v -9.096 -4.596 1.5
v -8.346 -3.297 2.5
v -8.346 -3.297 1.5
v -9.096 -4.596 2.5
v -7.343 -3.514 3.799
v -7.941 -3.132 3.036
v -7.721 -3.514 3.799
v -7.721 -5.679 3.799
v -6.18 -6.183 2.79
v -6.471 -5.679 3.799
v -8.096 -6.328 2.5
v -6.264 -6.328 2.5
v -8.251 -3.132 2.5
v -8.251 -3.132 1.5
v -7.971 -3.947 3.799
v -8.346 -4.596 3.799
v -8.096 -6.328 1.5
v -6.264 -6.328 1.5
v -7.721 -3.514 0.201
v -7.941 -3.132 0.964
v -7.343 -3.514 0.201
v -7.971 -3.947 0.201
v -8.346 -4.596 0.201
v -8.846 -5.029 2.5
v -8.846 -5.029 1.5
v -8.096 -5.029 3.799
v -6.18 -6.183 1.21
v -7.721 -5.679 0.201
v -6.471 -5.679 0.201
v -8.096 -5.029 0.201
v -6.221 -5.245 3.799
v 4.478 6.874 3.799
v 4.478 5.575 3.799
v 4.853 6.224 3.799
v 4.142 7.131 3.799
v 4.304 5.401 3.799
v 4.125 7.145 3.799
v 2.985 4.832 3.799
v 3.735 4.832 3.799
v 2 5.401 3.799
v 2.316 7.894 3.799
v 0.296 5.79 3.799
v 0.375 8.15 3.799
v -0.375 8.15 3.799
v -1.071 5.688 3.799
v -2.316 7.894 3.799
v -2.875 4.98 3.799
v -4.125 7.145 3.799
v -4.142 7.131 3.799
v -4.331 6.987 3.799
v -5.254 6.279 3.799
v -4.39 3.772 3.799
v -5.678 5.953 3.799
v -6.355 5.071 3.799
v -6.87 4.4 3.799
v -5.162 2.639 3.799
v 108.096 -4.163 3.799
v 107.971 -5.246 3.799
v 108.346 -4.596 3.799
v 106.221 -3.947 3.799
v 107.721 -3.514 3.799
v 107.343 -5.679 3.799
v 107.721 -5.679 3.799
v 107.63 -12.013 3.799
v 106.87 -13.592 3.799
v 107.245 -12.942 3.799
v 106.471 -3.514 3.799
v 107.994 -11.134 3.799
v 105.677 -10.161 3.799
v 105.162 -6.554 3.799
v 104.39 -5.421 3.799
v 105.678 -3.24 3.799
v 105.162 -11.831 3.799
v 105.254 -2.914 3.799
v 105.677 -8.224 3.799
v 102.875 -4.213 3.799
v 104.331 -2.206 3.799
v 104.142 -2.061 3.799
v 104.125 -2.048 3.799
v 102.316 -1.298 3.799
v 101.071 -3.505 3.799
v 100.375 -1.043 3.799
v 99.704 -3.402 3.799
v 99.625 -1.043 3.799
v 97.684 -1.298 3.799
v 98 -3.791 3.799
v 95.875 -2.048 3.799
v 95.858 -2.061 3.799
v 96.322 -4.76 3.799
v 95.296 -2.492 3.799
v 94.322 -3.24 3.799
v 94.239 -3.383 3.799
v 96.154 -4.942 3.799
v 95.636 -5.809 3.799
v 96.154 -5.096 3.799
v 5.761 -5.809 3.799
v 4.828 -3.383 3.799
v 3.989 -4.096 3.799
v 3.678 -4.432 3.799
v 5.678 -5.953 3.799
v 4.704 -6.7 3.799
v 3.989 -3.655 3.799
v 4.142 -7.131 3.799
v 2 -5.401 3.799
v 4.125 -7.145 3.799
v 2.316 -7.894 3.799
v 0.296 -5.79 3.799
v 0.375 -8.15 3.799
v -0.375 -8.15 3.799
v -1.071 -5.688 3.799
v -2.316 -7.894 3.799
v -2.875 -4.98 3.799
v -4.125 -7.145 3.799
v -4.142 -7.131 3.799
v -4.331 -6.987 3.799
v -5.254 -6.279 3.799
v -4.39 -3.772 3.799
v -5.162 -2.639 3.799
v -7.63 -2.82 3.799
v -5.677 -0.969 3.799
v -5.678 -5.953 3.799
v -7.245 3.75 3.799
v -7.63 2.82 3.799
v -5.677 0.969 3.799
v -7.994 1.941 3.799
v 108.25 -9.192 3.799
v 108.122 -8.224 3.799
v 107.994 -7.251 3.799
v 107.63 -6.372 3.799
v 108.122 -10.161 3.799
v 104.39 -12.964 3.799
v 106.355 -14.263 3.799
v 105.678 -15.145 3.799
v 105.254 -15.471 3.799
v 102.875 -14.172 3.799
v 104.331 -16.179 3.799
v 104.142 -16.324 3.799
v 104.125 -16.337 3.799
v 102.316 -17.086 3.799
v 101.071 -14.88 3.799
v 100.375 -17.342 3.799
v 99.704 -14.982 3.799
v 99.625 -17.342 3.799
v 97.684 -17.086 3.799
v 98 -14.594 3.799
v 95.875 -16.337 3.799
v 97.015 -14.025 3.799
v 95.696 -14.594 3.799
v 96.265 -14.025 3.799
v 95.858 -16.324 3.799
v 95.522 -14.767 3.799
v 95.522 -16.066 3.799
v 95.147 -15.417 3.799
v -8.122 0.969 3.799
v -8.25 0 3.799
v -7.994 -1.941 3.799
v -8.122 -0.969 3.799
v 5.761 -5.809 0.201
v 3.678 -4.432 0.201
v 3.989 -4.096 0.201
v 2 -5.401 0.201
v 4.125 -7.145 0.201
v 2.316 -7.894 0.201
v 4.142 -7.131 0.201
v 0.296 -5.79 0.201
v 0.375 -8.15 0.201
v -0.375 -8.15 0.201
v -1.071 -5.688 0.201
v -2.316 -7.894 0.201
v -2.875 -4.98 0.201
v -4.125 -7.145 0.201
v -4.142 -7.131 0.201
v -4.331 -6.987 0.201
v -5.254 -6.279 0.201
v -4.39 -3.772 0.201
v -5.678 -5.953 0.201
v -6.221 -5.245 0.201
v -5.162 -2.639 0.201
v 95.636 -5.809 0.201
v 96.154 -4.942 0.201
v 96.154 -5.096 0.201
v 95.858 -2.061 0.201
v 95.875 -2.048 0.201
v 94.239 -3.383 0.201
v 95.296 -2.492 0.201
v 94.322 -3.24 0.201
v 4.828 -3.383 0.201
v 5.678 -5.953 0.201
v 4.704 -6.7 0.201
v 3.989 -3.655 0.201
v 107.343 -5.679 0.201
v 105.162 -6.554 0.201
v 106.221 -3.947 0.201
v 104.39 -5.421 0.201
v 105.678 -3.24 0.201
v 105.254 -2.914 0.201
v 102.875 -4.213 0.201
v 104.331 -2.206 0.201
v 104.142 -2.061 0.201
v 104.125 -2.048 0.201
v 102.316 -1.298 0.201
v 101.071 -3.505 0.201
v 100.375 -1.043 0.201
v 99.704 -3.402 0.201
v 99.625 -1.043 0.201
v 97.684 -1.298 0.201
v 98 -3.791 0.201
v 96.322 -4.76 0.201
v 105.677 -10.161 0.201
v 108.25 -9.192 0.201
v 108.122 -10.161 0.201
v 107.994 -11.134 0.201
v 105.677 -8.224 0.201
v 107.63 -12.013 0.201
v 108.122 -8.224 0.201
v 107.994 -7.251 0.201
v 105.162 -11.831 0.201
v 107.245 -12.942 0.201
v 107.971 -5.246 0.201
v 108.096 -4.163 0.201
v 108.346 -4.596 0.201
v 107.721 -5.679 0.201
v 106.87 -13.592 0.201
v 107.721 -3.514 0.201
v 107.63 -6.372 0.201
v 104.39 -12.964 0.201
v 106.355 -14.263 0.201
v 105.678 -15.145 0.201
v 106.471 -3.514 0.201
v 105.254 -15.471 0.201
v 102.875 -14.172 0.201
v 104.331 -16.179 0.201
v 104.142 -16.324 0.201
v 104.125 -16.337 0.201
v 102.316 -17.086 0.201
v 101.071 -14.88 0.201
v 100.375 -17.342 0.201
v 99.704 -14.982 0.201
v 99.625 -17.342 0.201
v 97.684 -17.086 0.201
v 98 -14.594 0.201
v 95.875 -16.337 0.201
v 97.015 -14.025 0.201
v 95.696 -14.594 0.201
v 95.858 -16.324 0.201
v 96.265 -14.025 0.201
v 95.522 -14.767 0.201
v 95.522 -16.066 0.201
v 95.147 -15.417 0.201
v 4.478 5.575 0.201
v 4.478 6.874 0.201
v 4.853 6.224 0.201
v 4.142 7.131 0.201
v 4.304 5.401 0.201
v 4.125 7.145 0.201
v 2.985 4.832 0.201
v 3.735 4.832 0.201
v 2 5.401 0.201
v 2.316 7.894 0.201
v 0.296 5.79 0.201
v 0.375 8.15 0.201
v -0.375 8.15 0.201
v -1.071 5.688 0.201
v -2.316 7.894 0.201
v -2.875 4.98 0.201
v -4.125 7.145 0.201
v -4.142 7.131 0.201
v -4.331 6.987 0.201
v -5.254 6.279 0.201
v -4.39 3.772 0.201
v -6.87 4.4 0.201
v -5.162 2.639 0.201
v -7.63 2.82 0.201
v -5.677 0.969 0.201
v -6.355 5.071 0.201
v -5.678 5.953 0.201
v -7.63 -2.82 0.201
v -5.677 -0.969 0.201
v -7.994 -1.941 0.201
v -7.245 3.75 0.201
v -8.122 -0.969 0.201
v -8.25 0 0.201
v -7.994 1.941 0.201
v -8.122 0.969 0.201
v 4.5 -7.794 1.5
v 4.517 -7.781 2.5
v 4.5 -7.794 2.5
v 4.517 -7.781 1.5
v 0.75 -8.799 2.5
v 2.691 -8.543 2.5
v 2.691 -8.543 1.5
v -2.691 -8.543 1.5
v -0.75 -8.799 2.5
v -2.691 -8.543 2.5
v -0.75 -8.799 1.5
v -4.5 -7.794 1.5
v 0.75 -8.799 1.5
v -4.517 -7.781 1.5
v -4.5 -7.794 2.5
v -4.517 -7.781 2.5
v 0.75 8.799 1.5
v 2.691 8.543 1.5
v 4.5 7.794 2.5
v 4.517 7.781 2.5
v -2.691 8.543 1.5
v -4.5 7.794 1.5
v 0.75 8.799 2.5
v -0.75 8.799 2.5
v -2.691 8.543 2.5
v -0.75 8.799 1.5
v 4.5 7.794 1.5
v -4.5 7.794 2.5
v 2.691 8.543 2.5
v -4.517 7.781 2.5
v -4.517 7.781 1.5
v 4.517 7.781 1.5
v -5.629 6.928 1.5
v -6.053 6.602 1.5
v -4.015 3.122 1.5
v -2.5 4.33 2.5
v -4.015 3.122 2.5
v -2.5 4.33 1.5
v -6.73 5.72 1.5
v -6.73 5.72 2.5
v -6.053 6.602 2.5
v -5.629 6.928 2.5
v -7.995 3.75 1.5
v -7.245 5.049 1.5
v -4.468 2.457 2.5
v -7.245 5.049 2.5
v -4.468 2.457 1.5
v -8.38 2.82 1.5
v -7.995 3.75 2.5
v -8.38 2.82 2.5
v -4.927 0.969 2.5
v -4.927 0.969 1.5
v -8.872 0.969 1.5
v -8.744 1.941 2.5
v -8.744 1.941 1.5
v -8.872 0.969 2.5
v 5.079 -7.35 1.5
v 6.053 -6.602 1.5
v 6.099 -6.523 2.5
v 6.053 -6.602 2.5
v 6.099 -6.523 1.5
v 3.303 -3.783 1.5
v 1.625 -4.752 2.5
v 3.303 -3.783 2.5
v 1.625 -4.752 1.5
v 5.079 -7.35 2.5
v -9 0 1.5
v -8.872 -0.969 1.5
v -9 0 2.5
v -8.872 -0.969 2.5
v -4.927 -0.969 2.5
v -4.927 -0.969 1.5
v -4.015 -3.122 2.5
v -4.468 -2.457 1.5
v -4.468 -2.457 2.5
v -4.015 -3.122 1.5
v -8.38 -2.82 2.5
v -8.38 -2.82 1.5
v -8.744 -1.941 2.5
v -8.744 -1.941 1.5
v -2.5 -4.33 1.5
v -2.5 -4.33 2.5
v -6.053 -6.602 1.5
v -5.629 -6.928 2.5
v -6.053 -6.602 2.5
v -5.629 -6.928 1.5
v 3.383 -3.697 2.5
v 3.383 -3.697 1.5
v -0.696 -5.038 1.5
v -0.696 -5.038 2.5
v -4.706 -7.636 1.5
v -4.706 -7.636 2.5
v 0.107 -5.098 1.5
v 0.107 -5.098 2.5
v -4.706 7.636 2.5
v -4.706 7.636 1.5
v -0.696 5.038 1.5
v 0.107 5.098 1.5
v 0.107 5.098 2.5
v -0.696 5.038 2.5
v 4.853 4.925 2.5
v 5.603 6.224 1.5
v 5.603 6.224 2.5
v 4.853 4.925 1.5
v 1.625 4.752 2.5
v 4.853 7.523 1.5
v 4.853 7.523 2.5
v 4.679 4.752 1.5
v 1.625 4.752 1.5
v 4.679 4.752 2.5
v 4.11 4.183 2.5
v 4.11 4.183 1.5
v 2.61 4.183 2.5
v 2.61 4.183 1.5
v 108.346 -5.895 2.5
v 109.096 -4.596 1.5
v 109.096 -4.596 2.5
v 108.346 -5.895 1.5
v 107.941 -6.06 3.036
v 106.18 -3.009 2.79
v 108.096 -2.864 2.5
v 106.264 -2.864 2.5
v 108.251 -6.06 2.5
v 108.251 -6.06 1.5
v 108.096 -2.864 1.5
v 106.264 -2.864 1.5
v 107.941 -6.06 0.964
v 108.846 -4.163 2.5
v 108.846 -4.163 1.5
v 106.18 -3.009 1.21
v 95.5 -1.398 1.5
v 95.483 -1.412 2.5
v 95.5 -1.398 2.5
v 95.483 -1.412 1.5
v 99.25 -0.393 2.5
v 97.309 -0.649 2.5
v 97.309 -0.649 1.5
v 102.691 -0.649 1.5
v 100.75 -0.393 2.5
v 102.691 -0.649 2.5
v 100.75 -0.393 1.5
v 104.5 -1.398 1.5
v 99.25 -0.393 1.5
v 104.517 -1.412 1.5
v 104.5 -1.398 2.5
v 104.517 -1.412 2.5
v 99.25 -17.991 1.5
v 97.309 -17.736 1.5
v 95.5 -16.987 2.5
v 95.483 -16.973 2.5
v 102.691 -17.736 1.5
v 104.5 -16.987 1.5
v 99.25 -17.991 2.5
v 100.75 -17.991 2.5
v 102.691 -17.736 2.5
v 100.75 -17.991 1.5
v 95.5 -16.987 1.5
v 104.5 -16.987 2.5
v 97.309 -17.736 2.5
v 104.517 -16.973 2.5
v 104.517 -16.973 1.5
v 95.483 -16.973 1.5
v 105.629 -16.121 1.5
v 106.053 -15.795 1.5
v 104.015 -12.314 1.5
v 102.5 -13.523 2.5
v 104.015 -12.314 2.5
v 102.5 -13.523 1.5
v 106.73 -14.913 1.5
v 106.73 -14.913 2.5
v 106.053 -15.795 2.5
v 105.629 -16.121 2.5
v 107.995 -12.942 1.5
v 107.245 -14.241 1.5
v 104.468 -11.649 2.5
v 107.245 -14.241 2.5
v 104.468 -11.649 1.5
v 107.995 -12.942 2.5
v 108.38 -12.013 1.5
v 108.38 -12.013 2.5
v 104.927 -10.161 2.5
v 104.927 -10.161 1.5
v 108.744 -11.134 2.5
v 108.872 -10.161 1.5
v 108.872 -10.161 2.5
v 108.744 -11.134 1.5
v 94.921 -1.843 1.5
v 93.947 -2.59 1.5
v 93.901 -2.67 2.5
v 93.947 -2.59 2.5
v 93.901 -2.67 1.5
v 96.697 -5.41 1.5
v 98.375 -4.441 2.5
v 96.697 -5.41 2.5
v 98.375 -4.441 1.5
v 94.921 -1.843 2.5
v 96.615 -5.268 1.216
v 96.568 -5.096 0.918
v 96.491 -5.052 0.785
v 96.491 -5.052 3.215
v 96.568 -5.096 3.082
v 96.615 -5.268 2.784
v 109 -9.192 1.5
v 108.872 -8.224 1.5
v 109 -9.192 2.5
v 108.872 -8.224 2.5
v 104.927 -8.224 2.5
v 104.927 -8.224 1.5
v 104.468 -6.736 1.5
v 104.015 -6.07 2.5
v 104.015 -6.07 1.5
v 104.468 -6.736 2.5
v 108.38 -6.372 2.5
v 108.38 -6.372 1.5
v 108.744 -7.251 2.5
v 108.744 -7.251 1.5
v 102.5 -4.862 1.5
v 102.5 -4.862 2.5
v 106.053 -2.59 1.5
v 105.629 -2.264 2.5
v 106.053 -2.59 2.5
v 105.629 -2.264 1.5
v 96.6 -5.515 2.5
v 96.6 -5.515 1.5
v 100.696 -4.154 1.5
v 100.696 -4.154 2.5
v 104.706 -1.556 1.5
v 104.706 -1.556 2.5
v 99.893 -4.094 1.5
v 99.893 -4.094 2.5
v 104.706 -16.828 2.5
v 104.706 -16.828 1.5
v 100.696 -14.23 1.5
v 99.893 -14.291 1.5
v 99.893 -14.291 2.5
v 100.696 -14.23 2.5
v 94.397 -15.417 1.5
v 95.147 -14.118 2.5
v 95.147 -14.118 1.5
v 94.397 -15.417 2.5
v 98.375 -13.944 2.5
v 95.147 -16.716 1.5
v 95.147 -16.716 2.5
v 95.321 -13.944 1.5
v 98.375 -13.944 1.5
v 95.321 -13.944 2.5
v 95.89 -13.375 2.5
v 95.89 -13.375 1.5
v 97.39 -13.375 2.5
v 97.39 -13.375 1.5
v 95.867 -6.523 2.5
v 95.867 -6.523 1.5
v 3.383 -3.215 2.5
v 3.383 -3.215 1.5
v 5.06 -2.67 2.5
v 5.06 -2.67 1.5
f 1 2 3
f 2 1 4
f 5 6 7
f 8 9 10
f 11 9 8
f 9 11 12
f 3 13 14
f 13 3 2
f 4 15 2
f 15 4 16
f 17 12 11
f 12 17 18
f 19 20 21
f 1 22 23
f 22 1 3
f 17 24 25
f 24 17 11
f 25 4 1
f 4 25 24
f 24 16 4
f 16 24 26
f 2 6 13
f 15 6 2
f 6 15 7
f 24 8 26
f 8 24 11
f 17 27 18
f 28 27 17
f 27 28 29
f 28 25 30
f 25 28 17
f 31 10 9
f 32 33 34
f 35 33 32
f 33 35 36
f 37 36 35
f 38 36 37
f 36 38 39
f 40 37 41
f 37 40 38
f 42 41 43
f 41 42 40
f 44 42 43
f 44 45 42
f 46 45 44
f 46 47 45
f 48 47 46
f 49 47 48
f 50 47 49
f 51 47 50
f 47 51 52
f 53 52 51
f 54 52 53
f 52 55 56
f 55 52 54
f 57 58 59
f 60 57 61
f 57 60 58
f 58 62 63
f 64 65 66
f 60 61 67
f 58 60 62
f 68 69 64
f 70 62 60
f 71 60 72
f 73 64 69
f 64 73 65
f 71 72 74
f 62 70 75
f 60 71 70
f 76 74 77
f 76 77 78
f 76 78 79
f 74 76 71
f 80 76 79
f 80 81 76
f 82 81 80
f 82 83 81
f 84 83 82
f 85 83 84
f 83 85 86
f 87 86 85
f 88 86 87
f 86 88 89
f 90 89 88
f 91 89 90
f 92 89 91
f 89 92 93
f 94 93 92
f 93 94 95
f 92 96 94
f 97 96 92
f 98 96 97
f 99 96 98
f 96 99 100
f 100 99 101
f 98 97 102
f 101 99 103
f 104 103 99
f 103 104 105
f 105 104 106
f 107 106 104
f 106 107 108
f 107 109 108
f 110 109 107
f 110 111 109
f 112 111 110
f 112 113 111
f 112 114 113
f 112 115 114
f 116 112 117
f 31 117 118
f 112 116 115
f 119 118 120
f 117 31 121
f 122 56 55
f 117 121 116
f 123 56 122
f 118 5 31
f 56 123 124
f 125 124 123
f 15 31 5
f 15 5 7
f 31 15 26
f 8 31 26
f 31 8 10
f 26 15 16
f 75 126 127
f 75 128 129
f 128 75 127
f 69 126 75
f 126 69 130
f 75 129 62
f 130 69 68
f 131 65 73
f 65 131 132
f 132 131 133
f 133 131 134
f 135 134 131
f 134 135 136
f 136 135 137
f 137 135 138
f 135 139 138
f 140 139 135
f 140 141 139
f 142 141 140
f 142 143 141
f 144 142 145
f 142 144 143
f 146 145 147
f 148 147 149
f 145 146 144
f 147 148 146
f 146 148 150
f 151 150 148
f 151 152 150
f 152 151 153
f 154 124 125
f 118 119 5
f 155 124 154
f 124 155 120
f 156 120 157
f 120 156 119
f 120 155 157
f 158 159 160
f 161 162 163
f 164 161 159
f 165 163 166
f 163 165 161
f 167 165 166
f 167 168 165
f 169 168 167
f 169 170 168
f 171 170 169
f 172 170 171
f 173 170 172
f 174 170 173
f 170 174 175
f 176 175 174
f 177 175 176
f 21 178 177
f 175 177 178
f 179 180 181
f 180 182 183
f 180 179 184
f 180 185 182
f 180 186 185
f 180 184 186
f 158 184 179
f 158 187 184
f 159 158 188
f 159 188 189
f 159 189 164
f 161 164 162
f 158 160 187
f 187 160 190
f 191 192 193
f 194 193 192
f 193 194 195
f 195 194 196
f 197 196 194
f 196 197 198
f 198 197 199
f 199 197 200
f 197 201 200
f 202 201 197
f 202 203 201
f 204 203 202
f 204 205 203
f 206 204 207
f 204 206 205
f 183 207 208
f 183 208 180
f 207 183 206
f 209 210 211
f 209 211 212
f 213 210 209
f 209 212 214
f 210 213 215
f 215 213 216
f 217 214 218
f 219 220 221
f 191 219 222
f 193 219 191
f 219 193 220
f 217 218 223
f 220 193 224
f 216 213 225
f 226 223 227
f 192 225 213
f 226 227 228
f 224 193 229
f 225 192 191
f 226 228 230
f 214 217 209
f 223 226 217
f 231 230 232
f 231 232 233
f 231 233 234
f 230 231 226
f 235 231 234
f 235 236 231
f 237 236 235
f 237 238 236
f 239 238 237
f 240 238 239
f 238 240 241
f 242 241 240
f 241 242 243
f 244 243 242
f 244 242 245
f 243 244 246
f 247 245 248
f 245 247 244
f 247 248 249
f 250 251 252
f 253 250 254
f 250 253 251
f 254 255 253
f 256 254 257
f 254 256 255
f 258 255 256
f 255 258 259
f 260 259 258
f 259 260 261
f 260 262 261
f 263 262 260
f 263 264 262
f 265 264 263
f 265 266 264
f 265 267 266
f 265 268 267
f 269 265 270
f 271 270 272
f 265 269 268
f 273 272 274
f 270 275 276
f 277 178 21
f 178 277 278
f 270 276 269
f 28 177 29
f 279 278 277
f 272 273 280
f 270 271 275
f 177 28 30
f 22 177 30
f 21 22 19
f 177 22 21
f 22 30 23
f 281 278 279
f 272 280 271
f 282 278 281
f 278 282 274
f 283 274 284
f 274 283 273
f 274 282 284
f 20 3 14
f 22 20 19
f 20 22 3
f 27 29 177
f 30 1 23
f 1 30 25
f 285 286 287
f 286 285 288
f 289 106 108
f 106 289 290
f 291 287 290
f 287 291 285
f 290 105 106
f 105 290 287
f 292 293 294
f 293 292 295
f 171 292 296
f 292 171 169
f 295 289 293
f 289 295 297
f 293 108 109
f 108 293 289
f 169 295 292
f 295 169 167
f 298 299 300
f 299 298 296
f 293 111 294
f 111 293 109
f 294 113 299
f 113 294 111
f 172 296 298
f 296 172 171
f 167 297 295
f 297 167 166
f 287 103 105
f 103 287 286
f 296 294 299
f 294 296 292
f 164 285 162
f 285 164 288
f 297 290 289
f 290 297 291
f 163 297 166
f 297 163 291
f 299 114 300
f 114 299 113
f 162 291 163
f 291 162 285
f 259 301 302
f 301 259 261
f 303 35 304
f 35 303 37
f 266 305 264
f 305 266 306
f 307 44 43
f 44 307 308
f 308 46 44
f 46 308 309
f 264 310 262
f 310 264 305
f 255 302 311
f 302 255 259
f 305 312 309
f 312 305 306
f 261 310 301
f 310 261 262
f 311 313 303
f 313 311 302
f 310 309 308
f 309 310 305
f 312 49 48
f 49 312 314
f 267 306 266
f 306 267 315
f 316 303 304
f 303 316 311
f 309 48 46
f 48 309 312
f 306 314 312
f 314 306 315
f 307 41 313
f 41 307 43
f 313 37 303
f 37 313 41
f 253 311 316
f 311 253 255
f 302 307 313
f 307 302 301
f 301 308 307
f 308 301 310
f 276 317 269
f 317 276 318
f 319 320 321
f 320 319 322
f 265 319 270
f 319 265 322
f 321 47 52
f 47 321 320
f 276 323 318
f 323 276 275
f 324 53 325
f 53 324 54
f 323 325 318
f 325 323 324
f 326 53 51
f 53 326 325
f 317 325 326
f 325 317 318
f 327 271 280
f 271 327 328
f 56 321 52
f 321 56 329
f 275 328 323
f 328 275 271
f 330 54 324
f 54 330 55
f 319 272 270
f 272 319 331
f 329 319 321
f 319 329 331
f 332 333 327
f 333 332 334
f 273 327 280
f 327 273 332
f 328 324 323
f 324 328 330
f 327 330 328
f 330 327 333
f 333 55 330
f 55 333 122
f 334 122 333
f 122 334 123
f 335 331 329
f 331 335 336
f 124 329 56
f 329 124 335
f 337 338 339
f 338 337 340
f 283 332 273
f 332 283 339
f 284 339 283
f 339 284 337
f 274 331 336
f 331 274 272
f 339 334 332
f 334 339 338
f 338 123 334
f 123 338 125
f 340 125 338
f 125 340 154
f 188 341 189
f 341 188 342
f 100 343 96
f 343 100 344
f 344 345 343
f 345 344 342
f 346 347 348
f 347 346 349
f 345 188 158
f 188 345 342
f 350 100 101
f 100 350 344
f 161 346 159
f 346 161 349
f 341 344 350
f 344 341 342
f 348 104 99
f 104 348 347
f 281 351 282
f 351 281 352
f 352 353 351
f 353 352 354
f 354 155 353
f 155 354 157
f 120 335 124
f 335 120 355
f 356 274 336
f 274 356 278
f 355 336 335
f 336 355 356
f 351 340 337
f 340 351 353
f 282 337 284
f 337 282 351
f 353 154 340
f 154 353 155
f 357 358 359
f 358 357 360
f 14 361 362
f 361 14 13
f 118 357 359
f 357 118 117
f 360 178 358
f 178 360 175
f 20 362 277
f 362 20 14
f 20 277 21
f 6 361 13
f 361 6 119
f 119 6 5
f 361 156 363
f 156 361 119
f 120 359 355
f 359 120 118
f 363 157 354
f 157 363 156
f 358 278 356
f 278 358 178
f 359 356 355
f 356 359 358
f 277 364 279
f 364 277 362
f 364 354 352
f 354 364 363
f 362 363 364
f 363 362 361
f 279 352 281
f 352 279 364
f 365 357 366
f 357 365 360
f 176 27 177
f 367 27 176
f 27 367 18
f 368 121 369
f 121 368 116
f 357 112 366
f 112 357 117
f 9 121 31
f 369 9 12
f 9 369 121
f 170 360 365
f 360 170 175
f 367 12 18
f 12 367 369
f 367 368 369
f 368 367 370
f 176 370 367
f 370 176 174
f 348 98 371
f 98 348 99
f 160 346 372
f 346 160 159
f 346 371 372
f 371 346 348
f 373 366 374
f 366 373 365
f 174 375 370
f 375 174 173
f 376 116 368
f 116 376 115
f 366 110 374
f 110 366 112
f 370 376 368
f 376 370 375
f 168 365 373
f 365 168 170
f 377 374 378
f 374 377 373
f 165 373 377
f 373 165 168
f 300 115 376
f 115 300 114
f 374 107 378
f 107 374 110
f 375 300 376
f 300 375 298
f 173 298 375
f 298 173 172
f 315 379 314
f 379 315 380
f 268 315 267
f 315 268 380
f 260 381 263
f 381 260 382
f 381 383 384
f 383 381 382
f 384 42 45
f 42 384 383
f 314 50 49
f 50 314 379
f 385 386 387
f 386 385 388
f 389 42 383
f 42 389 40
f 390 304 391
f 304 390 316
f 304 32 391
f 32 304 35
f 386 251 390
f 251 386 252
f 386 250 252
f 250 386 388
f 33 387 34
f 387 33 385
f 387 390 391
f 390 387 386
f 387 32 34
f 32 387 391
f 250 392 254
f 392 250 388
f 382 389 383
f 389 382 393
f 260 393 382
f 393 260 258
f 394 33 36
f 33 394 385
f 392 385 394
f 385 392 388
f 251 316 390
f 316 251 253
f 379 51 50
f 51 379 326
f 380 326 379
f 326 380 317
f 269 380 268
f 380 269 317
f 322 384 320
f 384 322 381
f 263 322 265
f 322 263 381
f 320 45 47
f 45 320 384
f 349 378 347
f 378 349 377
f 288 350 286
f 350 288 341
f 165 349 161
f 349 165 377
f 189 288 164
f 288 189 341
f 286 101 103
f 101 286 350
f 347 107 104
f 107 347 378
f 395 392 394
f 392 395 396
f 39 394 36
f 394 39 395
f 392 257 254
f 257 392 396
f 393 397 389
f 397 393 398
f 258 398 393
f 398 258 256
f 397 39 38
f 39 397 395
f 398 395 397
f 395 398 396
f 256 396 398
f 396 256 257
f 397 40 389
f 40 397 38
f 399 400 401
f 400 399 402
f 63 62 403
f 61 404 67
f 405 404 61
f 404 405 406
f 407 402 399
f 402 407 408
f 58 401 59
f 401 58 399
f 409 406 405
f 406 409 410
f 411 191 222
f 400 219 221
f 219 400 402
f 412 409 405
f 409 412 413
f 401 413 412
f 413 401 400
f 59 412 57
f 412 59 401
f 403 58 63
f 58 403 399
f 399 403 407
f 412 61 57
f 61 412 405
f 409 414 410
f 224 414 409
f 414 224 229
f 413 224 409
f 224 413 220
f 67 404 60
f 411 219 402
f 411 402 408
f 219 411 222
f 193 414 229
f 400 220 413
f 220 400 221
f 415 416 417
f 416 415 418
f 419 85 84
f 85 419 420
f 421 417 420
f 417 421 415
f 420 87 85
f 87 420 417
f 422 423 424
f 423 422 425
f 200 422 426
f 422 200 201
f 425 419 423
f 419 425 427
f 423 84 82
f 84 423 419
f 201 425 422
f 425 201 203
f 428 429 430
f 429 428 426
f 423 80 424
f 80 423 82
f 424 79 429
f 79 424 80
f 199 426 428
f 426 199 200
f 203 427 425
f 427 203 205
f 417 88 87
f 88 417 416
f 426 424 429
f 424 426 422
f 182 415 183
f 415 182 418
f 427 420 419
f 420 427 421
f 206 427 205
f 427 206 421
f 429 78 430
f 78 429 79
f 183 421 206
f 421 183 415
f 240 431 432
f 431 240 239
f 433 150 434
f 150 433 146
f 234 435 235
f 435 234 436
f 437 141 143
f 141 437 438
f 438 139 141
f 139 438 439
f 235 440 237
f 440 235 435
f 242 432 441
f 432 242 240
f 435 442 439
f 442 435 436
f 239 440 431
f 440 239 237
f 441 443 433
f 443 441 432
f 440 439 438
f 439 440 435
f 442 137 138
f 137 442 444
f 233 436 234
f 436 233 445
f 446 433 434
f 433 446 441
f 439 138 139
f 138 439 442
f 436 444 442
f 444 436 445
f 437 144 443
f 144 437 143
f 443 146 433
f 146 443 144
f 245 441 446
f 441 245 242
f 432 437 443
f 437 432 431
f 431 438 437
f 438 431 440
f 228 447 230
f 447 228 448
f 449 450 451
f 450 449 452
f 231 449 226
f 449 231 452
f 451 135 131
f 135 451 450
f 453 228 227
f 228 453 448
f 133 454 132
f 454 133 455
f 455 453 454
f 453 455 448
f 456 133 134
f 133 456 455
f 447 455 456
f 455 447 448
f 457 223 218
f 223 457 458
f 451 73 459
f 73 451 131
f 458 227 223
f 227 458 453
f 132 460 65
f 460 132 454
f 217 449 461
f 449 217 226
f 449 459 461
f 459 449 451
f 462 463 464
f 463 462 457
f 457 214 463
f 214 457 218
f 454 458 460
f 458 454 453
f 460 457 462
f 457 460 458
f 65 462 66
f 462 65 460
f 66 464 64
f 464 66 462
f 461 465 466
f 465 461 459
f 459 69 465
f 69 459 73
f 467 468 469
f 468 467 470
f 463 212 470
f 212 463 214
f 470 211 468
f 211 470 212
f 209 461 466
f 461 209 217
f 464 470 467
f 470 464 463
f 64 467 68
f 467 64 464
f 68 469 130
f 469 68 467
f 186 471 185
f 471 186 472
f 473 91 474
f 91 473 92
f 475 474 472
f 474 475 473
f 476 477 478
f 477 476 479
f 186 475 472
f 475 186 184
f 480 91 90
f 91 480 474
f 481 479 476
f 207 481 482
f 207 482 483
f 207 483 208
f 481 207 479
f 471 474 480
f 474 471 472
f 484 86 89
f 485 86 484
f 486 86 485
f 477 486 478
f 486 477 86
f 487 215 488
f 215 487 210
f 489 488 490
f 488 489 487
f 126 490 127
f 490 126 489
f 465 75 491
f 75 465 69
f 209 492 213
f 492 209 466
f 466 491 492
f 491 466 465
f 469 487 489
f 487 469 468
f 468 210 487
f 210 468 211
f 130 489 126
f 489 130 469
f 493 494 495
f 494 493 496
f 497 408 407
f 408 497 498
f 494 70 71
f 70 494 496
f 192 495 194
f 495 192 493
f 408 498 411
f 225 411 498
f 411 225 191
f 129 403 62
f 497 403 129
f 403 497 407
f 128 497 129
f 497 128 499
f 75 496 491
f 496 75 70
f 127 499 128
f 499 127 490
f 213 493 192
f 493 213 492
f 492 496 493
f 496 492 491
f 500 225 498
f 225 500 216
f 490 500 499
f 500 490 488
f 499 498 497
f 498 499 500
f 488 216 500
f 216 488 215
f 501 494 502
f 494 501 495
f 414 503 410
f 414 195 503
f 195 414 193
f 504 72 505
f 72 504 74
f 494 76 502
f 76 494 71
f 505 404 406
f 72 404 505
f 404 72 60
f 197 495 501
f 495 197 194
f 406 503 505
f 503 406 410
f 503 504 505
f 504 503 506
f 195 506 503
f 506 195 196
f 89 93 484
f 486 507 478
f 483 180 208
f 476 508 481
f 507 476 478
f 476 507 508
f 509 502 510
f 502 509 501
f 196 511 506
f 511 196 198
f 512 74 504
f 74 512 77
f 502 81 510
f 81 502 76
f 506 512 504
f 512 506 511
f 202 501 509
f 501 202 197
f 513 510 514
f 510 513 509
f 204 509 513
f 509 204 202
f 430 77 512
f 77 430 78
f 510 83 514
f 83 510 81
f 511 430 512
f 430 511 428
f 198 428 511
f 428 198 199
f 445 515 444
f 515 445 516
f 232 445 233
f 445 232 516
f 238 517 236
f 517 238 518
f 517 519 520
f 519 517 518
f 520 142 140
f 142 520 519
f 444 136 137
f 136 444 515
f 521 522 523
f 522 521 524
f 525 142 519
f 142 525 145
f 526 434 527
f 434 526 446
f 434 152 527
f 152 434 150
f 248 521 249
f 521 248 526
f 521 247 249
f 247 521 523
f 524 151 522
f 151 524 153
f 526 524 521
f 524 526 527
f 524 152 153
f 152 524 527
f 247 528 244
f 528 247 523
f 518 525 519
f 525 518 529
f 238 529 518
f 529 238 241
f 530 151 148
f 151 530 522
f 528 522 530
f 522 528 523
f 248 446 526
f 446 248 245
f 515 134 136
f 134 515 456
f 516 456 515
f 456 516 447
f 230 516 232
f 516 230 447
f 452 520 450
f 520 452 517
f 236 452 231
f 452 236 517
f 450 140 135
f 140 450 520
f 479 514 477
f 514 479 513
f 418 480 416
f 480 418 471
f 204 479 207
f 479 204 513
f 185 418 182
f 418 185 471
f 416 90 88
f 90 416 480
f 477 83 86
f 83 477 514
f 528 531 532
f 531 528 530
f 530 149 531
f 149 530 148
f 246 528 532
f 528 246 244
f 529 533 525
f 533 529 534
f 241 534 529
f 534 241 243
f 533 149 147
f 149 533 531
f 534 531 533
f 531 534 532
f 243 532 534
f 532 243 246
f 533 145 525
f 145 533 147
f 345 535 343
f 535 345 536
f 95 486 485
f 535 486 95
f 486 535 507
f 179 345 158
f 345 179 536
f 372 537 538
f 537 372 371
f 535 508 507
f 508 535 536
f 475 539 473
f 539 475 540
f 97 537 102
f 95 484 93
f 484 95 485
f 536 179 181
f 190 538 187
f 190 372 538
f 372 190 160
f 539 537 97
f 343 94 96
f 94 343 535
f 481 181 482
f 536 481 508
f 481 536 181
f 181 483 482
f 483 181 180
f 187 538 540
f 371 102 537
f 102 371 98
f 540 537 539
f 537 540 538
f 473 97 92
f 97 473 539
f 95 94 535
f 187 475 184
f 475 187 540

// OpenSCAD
/*
Project:			3D printed hydroponics system
Repositiry:		https://github.com/telepath/v-hydro
File name:		hook.scad
Author:			Benjamin Richter
Email:			3dp@itrichter.de
License:			GPLv3 https://www.gnu.org/licenses/gpl-3.0.txt
Version:			1.1
Release:			2014-10-14
Update:			2014-11-15

Changelog:
1.1
- drip nose added

Modules:
 assembly(l=length)
	creates the complete assembly with two hook connected by a shaft. Parameters must be defined beforehand.

    This program is free software: you can redistribute it and/or modify
    it under the terms of the GNU General Public License as published by
    the Free Software Foundation, either version 3 of the License, or
    (at your option) any later version.

    This program is distributed in the hope that it will be useful,
    but WITHOUT ANY WARRANTY; without even the implied warranty of
    MERCHANTABILITY or FITNESS FOR A PARTICULAR PURPOSE.  See the
    GNU General Public License for more details.

    You should have received a copy of the GNU General Public License
    along with this program.  If not, see <http://www.gnu.org/licenses/>.
*/

length = 100;			//lenght from one hook center to other
wallThickness = 4;	//thickness of the hook
innerRadius = 5;		//inner radius of the hook

r = 1.5;					//rounding of edges

/********************/

hyp=innerRadius+r;
a=45;
ak=cos(a)*hyp;
gk=sin(a)*hyp;


module hook(){
	minkowski()
	{
		sphere(r,$fn=6);
		union() { difference(){
			translate([0,0,r])
				cylinder(r=innerRadius+wallThickness-r,h=wallThickness-r*2);
			translate([0,0,r])
				cylinder(r=innerRadius+r,h=wallThickness-r*2);
			rotate(-45)
				translate([-r,0,0])
					cube([innerRadius+wallThickness*2,innerRadius+wallThickness*2,wallThickness*2]);
		}
		translate([-ak-wallThickness+r,-gk,r])
			cylinder(h=wallThickness-r*2,r=wallThickness/2-r,$fn=6);	}
	}
}

module shaft(l=length){
	slength=l-ak*2;
	sthickness=wallThickness-r*2;

	minkowski()
	{
		sphere(r);
		translate([slength/2+ak,-(gk),r+sthickness/2])
			cube([slength,sthickness,sthickness],center=true);
	}
}

module assembly(l=length){
	hook(l);
	shaft(l);
	translate([l,-gk*2,0])
		rotate(180,[0,0,1])
			hook(l);
}

assembly(l=length);
